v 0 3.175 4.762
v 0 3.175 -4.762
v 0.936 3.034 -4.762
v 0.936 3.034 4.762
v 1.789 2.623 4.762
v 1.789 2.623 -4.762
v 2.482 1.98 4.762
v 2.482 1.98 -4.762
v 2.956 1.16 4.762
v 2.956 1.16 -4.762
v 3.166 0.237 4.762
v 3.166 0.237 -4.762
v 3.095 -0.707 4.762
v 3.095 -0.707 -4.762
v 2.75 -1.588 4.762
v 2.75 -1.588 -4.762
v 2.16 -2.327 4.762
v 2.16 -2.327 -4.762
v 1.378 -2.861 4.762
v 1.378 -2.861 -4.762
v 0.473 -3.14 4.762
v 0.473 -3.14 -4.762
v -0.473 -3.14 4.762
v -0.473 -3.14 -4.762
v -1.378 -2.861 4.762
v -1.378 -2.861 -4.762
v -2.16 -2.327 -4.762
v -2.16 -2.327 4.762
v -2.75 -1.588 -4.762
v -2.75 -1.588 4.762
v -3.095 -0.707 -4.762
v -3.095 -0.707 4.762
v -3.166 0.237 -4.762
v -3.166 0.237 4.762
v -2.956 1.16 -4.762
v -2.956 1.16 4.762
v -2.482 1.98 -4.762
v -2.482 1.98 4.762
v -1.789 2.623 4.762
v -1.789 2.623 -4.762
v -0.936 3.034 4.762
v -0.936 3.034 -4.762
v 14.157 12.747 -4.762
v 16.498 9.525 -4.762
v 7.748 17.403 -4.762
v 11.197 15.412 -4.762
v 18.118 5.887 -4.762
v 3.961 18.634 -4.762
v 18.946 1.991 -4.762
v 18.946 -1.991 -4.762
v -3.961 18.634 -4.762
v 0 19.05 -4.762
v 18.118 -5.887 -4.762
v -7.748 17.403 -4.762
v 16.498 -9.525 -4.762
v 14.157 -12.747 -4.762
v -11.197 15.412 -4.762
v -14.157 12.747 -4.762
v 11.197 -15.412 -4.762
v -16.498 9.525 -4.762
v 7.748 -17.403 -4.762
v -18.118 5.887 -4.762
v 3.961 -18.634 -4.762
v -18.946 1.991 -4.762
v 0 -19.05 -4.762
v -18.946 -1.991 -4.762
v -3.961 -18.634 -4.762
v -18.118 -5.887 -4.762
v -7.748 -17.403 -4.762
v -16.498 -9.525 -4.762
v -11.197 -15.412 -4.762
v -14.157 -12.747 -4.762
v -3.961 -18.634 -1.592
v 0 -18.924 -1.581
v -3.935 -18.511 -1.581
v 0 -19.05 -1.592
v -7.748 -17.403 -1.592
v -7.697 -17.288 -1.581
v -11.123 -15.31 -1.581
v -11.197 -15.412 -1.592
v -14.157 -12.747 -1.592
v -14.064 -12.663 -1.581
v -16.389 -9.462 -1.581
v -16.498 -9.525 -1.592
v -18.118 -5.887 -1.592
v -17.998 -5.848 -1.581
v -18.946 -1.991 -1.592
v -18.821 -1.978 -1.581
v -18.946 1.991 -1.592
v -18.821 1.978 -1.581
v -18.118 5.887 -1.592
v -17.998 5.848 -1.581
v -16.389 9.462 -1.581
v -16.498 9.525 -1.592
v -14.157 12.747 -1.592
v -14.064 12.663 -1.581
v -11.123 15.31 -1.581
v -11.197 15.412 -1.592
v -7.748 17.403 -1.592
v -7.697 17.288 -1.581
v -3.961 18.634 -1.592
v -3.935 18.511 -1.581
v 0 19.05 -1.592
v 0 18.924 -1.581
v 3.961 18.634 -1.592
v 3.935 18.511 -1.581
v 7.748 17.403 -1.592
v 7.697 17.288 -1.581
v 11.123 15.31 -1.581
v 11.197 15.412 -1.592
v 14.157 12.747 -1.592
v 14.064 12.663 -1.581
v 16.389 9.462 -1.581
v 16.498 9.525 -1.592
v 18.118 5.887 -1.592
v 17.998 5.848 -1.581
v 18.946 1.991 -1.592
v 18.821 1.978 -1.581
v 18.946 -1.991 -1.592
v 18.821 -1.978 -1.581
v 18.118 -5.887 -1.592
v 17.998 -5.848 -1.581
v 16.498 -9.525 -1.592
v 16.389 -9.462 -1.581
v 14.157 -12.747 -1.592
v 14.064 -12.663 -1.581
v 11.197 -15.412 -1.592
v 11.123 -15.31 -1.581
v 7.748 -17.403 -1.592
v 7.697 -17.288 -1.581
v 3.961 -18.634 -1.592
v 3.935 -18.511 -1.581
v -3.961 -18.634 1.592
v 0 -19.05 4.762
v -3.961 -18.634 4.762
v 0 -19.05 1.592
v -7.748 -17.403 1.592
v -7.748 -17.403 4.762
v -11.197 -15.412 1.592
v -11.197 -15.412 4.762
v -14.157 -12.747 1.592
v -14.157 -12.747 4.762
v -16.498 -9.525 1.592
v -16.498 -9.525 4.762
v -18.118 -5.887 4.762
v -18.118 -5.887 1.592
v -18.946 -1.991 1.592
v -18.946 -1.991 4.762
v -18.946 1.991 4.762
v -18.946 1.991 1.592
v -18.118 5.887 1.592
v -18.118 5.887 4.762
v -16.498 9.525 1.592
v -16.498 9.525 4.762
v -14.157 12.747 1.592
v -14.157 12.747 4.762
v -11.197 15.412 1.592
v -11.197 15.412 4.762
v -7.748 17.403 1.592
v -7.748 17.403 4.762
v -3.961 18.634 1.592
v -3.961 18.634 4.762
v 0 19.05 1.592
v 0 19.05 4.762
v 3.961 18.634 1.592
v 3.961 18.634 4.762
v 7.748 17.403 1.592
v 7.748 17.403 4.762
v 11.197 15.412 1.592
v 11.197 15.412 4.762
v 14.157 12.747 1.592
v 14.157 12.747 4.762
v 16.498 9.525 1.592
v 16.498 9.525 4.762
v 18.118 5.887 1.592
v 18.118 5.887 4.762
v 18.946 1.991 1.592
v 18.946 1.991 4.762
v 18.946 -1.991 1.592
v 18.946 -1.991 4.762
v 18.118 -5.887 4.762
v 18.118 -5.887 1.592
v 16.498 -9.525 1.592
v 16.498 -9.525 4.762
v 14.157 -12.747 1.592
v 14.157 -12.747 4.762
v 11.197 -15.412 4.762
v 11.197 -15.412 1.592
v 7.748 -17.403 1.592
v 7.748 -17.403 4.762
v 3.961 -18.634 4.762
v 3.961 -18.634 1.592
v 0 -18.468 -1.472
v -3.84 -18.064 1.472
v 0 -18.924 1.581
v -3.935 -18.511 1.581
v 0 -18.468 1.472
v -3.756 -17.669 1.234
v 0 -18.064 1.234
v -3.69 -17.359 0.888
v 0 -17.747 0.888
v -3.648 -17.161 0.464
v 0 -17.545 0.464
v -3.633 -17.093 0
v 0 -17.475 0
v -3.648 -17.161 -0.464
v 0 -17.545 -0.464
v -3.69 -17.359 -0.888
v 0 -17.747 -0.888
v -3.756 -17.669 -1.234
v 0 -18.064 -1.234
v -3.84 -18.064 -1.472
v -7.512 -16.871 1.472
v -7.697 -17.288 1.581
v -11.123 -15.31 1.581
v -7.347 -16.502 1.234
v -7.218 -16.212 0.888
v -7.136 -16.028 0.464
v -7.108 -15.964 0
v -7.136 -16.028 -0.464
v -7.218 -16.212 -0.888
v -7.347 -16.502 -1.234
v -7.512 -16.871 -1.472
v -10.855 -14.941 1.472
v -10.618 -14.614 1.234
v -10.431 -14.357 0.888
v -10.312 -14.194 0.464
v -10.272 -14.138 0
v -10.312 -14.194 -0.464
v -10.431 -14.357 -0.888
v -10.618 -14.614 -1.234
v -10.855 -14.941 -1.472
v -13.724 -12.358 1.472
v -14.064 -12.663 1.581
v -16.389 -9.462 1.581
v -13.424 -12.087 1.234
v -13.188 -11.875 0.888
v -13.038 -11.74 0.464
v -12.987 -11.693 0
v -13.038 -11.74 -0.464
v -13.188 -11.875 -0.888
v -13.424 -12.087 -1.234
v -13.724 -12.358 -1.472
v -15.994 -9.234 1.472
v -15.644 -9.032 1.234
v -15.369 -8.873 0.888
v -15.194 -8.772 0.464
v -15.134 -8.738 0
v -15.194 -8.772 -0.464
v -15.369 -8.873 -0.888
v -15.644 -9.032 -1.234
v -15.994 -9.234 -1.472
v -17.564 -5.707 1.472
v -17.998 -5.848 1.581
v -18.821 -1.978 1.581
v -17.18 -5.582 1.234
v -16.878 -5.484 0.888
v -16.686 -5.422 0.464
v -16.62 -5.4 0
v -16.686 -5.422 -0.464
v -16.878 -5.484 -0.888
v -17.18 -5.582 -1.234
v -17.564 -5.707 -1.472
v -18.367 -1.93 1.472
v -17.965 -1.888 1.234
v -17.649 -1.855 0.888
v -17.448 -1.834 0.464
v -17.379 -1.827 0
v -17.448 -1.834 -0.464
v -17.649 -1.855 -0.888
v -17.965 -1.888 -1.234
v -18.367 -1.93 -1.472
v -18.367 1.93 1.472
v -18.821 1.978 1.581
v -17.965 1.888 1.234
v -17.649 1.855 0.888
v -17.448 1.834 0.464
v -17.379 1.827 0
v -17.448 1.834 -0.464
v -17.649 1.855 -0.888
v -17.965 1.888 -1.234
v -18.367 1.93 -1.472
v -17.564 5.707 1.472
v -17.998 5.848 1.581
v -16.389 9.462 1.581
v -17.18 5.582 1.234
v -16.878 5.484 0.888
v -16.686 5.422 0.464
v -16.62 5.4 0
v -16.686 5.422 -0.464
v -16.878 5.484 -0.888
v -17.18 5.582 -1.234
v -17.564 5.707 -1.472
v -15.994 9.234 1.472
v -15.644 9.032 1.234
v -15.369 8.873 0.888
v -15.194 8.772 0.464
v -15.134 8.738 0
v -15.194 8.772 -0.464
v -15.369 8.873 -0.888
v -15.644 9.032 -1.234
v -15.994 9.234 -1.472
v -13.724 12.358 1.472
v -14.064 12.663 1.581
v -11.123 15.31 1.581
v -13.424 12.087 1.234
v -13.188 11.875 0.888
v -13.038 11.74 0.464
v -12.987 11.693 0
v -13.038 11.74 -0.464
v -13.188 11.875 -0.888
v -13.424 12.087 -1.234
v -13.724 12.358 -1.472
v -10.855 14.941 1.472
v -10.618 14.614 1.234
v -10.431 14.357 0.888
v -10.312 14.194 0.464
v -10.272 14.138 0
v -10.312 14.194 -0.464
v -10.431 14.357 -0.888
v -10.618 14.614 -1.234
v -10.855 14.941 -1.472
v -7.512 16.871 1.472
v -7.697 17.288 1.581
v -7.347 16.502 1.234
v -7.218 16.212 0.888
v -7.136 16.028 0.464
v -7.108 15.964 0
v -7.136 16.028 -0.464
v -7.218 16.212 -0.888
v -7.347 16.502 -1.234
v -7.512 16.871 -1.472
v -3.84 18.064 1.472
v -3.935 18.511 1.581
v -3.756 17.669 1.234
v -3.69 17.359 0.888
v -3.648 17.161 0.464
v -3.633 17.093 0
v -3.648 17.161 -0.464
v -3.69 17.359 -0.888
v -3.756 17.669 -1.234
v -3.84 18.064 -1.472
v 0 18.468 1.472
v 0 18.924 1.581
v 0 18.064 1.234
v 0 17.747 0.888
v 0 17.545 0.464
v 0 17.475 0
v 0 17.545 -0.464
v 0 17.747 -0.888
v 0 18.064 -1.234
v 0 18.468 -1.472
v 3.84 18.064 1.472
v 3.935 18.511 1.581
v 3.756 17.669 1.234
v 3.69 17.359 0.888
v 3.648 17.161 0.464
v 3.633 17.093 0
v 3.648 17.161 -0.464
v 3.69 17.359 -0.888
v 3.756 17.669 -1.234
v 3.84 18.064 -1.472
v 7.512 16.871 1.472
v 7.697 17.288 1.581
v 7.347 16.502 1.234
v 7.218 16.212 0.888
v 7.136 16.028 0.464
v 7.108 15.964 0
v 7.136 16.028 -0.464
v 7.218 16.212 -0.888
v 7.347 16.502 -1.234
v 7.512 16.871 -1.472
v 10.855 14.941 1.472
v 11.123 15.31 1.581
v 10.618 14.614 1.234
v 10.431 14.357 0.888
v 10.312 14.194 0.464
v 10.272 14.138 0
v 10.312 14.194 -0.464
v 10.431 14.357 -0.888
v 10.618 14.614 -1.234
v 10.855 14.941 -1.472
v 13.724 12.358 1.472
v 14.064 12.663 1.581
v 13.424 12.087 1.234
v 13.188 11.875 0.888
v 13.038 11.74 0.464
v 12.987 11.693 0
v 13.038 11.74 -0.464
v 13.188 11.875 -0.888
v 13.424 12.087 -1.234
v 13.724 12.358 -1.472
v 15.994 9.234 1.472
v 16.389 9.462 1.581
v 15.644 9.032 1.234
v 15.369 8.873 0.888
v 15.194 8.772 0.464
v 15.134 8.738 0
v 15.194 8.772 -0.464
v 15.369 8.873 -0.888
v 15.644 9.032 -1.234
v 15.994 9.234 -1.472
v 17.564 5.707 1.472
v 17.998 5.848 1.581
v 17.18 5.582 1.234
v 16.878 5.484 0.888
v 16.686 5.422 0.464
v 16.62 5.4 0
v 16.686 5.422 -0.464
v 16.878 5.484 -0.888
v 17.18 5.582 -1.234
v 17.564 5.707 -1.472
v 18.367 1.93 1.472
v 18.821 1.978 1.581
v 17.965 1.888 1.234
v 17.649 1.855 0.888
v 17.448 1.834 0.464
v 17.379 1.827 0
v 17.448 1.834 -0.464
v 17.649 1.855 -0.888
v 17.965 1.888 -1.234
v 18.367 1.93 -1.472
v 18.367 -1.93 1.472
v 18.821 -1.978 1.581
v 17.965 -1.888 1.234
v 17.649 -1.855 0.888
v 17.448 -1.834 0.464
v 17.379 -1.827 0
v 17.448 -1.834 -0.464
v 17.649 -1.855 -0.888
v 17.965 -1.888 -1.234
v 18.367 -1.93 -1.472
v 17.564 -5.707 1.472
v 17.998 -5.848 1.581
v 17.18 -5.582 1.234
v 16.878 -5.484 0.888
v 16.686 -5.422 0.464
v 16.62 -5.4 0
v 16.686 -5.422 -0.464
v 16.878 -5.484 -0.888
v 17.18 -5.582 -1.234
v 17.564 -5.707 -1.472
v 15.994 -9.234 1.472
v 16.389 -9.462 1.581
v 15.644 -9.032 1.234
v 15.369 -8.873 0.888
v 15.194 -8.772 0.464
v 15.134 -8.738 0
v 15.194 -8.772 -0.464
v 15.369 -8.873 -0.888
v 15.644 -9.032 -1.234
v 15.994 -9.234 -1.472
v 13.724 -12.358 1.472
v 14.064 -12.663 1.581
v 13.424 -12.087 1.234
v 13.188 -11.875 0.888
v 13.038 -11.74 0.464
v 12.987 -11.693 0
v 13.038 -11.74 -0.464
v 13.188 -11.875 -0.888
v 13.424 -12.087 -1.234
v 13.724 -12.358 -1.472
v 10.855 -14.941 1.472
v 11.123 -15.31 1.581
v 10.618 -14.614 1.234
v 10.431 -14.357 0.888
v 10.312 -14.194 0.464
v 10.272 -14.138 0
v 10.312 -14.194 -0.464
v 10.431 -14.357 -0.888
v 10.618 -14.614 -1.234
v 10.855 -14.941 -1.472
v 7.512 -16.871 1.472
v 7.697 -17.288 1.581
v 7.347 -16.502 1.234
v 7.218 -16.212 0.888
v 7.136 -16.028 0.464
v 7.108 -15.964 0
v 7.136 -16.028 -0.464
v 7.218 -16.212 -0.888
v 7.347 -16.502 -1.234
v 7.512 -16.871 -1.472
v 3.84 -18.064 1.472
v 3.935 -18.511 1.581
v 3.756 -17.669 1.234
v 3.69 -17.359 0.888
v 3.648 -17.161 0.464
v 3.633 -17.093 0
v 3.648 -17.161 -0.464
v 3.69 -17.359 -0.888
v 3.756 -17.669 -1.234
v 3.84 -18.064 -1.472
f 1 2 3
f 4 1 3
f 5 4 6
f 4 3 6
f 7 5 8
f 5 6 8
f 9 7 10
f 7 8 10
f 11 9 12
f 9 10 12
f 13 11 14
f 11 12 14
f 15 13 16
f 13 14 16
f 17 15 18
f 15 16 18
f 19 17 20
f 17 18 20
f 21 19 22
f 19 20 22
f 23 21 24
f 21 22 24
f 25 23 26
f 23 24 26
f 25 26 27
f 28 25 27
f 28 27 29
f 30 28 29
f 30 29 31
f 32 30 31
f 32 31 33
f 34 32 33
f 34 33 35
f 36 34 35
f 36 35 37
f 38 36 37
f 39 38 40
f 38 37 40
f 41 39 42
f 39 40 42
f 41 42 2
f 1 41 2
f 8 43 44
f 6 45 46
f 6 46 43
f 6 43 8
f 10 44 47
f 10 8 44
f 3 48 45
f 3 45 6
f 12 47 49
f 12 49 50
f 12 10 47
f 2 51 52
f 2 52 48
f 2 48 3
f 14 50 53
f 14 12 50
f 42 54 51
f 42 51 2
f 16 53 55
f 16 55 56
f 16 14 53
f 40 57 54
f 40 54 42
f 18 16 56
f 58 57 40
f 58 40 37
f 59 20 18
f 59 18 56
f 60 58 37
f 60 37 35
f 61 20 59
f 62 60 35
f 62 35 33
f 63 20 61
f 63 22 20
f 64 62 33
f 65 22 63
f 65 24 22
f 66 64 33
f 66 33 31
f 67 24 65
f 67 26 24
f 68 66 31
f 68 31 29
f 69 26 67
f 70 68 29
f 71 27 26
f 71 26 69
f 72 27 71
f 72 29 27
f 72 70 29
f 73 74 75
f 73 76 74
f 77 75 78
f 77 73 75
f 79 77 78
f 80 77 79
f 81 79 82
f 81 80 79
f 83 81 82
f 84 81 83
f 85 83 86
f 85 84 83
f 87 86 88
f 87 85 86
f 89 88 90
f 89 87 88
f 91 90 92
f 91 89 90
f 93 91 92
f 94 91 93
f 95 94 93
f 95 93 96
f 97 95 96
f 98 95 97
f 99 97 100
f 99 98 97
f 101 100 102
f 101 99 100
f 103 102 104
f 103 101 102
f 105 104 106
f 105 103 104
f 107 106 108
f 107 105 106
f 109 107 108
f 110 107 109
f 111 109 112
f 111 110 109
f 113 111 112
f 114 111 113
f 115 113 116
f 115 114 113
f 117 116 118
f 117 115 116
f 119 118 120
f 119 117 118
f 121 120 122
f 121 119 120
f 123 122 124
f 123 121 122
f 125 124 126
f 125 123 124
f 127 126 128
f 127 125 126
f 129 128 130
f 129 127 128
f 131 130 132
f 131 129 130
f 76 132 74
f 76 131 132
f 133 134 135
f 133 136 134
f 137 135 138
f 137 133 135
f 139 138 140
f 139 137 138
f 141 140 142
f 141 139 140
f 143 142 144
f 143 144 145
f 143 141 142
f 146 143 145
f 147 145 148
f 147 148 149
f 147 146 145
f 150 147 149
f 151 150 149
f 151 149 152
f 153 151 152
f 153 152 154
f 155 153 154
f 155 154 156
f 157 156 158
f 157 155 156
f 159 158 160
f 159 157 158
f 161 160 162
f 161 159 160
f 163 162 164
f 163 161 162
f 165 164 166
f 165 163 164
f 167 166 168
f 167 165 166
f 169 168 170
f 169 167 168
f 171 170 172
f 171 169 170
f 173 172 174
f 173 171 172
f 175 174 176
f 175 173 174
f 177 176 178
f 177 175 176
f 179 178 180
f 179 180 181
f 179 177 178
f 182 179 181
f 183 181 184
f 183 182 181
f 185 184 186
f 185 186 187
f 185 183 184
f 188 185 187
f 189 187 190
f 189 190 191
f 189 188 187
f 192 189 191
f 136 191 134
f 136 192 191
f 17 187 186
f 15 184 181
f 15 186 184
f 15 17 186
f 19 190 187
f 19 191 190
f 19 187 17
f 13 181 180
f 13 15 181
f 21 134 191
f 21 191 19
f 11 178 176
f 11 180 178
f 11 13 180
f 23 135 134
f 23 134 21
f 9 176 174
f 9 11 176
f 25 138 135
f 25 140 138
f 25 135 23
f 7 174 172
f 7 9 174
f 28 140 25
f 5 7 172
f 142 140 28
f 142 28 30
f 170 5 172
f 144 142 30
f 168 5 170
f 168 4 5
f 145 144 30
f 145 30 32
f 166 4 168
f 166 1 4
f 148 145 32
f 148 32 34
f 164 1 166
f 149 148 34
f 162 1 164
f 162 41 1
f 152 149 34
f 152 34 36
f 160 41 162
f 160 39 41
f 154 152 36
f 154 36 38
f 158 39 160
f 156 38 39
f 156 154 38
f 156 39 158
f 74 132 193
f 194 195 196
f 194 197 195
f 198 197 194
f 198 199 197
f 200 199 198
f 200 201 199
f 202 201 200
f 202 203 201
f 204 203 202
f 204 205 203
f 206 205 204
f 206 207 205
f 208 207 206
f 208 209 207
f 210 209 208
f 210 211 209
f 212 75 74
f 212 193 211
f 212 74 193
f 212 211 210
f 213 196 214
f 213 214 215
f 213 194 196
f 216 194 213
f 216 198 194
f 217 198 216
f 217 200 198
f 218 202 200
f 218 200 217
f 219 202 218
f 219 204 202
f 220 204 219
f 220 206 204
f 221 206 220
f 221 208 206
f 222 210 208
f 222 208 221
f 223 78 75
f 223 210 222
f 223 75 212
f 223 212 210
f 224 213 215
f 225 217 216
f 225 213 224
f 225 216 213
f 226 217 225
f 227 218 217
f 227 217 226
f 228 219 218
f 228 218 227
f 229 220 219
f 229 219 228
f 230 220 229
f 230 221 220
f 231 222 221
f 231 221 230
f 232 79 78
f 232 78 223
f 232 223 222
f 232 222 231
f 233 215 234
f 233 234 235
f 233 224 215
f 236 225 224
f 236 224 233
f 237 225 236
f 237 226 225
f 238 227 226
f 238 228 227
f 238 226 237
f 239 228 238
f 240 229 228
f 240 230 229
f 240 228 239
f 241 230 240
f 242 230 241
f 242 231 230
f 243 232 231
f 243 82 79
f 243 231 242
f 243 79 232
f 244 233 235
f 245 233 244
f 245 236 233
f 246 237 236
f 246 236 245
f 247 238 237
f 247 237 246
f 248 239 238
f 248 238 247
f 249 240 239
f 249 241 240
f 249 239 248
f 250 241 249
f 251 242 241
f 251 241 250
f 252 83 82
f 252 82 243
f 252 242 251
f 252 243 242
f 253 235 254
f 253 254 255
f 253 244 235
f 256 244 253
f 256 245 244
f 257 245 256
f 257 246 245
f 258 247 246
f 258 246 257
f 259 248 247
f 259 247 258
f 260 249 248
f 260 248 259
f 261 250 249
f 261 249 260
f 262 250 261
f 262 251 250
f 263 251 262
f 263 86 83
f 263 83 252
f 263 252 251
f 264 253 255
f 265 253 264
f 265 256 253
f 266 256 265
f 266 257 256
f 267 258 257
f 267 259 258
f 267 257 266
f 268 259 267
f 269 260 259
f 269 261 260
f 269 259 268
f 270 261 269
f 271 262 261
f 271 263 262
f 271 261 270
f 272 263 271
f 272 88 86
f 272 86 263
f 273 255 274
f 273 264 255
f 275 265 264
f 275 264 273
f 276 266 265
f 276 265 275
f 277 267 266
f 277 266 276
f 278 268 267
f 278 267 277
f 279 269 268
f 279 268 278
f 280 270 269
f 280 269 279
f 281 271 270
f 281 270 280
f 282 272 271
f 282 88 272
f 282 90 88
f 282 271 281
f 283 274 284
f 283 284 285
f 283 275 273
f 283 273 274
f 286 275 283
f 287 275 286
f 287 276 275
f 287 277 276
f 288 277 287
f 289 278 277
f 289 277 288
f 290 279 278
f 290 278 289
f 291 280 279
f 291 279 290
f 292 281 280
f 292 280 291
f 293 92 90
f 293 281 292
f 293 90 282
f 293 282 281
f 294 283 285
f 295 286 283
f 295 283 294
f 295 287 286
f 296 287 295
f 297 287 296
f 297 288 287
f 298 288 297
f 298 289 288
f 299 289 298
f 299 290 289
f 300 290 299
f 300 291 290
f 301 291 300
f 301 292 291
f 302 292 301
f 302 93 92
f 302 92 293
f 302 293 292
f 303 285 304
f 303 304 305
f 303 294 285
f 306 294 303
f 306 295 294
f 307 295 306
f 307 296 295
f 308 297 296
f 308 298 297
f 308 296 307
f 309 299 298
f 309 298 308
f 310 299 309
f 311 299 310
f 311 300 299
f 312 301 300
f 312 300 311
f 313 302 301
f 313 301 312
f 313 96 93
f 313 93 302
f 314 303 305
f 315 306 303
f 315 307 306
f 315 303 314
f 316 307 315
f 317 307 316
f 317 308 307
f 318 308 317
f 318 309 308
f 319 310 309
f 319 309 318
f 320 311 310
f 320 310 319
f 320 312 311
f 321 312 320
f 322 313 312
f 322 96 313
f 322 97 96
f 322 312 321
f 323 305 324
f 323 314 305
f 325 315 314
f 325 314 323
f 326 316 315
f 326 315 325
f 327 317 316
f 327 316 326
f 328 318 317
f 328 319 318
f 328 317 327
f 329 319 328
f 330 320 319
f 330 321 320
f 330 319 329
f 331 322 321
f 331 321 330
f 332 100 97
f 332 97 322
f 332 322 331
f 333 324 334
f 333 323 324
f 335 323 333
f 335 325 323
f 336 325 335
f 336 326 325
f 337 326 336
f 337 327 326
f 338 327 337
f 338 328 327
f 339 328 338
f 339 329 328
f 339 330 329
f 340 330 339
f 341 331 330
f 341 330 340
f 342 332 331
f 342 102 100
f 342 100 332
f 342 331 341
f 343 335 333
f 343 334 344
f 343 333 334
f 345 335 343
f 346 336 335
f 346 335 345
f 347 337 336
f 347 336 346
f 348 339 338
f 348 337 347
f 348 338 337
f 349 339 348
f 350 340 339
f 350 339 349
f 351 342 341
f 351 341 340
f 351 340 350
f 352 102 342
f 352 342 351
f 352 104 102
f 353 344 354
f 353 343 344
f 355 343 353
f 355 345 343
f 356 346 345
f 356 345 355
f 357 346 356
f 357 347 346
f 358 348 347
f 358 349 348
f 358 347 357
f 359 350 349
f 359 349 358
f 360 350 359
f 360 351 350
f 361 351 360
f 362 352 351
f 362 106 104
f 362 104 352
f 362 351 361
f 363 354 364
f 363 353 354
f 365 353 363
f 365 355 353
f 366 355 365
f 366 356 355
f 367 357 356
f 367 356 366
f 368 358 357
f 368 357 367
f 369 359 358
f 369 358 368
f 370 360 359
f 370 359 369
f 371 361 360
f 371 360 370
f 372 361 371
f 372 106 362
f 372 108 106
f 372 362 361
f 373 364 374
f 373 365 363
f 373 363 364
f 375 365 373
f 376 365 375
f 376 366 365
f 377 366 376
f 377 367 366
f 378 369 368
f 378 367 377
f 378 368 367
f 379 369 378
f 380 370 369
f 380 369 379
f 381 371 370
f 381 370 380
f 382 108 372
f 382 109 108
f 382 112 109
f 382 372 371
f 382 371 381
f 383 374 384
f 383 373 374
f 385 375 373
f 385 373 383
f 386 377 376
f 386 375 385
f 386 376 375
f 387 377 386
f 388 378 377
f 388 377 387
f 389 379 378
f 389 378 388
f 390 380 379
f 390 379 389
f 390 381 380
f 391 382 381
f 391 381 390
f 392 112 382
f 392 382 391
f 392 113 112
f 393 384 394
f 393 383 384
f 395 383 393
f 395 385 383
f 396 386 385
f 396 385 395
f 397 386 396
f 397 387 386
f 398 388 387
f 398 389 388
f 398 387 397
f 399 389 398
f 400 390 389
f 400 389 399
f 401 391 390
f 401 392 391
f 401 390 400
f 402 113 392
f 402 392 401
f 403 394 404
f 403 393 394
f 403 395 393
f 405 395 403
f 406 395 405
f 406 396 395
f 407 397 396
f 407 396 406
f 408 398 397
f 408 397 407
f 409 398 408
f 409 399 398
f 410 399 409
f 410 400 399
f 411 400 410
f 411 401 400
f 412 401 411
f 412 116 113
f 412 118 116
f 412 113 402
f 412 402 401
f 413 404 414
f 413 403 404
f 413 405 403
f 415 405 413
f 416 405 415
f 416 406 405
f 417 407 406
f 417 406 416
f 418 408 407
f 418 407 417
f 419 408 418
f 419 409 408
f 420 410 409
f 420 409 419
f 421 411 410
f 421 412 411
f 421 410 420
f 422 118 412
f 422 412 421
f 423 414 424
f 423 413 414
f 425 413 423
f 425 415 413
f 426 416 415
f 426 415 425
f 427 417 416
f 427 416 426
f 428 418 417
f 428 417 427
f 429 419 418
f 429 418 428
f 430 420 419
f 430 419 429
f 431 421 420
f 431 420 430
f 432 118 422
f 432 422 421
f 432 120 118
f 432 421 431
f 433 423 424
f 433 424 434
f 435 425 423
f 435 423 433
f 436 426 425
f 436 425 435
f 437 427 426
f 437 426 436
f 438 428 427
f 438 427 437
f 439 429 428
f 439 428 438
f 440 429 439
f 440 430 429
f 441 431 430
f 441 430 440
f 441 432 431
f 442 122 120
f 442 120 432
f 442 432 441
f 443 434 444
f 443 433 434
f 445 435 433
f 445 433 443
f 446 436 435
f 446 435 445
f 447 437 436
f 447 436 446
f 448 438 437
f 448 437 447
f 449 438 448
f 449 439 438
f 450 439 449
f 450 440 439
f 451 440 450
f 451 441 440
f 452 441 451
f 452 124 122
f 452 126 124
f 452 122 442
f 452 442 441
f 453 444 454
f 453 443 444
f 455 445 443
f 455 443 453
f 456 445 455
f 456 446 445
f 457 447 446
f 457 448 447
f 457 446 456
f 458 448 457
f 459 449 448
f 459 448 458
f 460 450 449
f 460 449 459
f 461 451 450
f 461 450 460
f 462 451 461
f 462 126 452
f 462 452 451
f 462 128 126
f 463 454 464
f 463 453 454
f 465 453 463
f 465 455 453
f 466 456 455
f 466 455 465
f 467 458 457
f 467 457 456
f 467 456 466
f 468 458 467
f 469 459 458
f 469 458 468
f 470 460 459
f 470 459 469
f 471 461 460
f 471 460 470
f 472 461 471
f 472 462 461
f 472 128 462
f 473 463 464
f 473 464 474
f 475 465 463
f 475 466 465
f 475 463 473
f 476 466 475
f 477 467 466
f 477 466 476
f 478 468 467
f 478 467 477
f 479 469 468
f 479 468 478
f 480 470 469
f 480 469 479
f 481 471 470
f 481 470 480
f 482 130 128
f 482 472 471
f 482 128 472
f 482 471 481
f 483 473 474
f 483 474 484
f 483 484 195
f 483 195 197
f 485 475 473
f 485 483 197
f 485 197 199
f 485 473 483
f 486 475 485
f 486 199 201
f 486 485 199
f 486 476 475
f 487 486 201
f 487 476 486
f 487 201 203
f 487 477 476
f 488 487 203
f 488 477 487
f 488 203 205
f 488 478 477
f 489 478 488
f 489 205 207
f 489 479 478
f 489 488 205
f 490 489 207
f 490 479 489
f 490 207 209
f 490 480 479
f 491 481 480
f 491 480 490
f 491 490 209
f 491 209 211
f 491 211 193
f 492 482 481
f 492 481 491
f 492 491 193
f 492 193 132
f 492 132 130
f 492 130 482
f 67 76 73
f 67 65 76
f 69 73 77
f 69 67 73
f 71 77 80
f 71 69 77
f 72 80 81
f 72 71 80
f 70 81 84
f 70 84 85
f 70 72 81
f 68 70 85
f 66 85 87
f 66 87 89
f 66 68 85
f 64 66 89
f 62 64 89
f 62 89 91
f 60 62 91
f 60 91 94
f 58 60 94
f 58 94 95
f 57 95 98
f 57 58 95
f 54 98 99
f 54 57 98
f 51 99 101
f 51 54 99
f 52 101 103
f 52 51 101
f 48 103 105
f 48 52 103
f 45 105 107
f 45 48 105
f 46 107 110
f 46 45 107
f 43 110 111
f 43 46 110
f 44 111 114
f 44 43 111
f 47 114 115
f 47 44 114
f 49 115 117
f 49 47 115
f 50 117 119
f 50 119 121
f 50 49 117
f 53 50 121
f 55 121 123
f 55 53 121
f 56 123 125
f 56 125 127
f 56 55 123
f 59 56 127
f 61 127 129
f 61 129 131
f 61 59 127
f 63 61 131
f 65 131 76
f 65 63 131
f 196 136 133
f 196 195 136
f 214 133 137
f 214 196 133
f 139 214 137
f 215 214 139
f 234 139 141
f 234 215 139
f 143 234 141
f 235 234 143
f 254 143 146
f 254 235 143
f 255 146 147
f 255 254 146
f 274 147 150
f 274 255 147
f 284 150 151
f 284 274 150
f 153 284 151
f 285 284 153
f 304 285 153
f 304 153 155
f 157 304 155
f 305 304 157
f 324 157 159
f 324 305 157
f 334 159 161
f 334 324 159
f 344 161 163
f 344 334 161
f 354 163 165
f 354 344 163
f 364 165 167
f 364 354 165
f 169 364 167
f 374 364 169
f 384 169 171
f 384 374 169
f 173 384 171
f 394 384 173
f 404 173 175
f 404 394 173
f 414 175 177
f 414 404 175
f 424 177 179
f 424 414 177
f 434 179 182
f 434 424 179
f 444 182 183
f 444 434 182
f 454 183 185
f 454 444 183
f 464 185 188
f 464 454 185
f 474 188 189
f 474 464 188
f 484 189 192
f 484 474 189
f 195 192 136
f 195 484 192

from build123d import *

# Parameters (mm, degrees)
SKETCH2_R          = 3.175
CUT_EXTRUDE1_DEPTH = 9.525


with BuildPart() as part:
    # Sketch1 → Revolve1 (revolve)
    with BuildSketch(Plane(origin=(0, 0, 0), x_dir=(0, 0, -1), z_dir=(1, 0, 0)), mode=Mode.PRIVATE) as revolve1_sk:
        with BuildLine():
            Line((1.592452886, 19.05), (4.7625, 19.05))
            Line((4.7625, 19.05), (4.7625, 0))
            Line((4.7625, 0), (-4.7625, 0))
            Line((-4.7625, 0), (-4.7625, 19.05))
            Line((-4.7625, 19.05), (-1.592452886, 19.05))
            Line((-1.592452886, 19.05), (-1.581459083, 18.924340258))
            ThreePointArc((-1.581459083, 18.924340258), (0, 17.4752), (1.581459083, 18.924340258))
            Line((1.581459083, 18.924340258), (1.592452886, 19.05))
        make_face()
    revolve(revolve1_sk.sketch.rotate(Axis((0, 0, 4.7625), (0, 0, -1)), 180), axis=Axis((0, 0, 4.7625), (0, 0, -1)))

    # Sketch2 → Cut-Extrude1 (cut)
    with BuildSketch(Plane(origin=(0, 0, -4.7625), x_dir=(-1, 0, 0), z_dir=(0, 0, -1))):
        with Locations(Location((0, 0, 0), (0, 0, 90))):
            Circle(SKETCH2_R)
    extrude(amount=-CUT_EXTRUDE1_DEPTH, mode=Mode.SUBTRACT)


solid = part.part
